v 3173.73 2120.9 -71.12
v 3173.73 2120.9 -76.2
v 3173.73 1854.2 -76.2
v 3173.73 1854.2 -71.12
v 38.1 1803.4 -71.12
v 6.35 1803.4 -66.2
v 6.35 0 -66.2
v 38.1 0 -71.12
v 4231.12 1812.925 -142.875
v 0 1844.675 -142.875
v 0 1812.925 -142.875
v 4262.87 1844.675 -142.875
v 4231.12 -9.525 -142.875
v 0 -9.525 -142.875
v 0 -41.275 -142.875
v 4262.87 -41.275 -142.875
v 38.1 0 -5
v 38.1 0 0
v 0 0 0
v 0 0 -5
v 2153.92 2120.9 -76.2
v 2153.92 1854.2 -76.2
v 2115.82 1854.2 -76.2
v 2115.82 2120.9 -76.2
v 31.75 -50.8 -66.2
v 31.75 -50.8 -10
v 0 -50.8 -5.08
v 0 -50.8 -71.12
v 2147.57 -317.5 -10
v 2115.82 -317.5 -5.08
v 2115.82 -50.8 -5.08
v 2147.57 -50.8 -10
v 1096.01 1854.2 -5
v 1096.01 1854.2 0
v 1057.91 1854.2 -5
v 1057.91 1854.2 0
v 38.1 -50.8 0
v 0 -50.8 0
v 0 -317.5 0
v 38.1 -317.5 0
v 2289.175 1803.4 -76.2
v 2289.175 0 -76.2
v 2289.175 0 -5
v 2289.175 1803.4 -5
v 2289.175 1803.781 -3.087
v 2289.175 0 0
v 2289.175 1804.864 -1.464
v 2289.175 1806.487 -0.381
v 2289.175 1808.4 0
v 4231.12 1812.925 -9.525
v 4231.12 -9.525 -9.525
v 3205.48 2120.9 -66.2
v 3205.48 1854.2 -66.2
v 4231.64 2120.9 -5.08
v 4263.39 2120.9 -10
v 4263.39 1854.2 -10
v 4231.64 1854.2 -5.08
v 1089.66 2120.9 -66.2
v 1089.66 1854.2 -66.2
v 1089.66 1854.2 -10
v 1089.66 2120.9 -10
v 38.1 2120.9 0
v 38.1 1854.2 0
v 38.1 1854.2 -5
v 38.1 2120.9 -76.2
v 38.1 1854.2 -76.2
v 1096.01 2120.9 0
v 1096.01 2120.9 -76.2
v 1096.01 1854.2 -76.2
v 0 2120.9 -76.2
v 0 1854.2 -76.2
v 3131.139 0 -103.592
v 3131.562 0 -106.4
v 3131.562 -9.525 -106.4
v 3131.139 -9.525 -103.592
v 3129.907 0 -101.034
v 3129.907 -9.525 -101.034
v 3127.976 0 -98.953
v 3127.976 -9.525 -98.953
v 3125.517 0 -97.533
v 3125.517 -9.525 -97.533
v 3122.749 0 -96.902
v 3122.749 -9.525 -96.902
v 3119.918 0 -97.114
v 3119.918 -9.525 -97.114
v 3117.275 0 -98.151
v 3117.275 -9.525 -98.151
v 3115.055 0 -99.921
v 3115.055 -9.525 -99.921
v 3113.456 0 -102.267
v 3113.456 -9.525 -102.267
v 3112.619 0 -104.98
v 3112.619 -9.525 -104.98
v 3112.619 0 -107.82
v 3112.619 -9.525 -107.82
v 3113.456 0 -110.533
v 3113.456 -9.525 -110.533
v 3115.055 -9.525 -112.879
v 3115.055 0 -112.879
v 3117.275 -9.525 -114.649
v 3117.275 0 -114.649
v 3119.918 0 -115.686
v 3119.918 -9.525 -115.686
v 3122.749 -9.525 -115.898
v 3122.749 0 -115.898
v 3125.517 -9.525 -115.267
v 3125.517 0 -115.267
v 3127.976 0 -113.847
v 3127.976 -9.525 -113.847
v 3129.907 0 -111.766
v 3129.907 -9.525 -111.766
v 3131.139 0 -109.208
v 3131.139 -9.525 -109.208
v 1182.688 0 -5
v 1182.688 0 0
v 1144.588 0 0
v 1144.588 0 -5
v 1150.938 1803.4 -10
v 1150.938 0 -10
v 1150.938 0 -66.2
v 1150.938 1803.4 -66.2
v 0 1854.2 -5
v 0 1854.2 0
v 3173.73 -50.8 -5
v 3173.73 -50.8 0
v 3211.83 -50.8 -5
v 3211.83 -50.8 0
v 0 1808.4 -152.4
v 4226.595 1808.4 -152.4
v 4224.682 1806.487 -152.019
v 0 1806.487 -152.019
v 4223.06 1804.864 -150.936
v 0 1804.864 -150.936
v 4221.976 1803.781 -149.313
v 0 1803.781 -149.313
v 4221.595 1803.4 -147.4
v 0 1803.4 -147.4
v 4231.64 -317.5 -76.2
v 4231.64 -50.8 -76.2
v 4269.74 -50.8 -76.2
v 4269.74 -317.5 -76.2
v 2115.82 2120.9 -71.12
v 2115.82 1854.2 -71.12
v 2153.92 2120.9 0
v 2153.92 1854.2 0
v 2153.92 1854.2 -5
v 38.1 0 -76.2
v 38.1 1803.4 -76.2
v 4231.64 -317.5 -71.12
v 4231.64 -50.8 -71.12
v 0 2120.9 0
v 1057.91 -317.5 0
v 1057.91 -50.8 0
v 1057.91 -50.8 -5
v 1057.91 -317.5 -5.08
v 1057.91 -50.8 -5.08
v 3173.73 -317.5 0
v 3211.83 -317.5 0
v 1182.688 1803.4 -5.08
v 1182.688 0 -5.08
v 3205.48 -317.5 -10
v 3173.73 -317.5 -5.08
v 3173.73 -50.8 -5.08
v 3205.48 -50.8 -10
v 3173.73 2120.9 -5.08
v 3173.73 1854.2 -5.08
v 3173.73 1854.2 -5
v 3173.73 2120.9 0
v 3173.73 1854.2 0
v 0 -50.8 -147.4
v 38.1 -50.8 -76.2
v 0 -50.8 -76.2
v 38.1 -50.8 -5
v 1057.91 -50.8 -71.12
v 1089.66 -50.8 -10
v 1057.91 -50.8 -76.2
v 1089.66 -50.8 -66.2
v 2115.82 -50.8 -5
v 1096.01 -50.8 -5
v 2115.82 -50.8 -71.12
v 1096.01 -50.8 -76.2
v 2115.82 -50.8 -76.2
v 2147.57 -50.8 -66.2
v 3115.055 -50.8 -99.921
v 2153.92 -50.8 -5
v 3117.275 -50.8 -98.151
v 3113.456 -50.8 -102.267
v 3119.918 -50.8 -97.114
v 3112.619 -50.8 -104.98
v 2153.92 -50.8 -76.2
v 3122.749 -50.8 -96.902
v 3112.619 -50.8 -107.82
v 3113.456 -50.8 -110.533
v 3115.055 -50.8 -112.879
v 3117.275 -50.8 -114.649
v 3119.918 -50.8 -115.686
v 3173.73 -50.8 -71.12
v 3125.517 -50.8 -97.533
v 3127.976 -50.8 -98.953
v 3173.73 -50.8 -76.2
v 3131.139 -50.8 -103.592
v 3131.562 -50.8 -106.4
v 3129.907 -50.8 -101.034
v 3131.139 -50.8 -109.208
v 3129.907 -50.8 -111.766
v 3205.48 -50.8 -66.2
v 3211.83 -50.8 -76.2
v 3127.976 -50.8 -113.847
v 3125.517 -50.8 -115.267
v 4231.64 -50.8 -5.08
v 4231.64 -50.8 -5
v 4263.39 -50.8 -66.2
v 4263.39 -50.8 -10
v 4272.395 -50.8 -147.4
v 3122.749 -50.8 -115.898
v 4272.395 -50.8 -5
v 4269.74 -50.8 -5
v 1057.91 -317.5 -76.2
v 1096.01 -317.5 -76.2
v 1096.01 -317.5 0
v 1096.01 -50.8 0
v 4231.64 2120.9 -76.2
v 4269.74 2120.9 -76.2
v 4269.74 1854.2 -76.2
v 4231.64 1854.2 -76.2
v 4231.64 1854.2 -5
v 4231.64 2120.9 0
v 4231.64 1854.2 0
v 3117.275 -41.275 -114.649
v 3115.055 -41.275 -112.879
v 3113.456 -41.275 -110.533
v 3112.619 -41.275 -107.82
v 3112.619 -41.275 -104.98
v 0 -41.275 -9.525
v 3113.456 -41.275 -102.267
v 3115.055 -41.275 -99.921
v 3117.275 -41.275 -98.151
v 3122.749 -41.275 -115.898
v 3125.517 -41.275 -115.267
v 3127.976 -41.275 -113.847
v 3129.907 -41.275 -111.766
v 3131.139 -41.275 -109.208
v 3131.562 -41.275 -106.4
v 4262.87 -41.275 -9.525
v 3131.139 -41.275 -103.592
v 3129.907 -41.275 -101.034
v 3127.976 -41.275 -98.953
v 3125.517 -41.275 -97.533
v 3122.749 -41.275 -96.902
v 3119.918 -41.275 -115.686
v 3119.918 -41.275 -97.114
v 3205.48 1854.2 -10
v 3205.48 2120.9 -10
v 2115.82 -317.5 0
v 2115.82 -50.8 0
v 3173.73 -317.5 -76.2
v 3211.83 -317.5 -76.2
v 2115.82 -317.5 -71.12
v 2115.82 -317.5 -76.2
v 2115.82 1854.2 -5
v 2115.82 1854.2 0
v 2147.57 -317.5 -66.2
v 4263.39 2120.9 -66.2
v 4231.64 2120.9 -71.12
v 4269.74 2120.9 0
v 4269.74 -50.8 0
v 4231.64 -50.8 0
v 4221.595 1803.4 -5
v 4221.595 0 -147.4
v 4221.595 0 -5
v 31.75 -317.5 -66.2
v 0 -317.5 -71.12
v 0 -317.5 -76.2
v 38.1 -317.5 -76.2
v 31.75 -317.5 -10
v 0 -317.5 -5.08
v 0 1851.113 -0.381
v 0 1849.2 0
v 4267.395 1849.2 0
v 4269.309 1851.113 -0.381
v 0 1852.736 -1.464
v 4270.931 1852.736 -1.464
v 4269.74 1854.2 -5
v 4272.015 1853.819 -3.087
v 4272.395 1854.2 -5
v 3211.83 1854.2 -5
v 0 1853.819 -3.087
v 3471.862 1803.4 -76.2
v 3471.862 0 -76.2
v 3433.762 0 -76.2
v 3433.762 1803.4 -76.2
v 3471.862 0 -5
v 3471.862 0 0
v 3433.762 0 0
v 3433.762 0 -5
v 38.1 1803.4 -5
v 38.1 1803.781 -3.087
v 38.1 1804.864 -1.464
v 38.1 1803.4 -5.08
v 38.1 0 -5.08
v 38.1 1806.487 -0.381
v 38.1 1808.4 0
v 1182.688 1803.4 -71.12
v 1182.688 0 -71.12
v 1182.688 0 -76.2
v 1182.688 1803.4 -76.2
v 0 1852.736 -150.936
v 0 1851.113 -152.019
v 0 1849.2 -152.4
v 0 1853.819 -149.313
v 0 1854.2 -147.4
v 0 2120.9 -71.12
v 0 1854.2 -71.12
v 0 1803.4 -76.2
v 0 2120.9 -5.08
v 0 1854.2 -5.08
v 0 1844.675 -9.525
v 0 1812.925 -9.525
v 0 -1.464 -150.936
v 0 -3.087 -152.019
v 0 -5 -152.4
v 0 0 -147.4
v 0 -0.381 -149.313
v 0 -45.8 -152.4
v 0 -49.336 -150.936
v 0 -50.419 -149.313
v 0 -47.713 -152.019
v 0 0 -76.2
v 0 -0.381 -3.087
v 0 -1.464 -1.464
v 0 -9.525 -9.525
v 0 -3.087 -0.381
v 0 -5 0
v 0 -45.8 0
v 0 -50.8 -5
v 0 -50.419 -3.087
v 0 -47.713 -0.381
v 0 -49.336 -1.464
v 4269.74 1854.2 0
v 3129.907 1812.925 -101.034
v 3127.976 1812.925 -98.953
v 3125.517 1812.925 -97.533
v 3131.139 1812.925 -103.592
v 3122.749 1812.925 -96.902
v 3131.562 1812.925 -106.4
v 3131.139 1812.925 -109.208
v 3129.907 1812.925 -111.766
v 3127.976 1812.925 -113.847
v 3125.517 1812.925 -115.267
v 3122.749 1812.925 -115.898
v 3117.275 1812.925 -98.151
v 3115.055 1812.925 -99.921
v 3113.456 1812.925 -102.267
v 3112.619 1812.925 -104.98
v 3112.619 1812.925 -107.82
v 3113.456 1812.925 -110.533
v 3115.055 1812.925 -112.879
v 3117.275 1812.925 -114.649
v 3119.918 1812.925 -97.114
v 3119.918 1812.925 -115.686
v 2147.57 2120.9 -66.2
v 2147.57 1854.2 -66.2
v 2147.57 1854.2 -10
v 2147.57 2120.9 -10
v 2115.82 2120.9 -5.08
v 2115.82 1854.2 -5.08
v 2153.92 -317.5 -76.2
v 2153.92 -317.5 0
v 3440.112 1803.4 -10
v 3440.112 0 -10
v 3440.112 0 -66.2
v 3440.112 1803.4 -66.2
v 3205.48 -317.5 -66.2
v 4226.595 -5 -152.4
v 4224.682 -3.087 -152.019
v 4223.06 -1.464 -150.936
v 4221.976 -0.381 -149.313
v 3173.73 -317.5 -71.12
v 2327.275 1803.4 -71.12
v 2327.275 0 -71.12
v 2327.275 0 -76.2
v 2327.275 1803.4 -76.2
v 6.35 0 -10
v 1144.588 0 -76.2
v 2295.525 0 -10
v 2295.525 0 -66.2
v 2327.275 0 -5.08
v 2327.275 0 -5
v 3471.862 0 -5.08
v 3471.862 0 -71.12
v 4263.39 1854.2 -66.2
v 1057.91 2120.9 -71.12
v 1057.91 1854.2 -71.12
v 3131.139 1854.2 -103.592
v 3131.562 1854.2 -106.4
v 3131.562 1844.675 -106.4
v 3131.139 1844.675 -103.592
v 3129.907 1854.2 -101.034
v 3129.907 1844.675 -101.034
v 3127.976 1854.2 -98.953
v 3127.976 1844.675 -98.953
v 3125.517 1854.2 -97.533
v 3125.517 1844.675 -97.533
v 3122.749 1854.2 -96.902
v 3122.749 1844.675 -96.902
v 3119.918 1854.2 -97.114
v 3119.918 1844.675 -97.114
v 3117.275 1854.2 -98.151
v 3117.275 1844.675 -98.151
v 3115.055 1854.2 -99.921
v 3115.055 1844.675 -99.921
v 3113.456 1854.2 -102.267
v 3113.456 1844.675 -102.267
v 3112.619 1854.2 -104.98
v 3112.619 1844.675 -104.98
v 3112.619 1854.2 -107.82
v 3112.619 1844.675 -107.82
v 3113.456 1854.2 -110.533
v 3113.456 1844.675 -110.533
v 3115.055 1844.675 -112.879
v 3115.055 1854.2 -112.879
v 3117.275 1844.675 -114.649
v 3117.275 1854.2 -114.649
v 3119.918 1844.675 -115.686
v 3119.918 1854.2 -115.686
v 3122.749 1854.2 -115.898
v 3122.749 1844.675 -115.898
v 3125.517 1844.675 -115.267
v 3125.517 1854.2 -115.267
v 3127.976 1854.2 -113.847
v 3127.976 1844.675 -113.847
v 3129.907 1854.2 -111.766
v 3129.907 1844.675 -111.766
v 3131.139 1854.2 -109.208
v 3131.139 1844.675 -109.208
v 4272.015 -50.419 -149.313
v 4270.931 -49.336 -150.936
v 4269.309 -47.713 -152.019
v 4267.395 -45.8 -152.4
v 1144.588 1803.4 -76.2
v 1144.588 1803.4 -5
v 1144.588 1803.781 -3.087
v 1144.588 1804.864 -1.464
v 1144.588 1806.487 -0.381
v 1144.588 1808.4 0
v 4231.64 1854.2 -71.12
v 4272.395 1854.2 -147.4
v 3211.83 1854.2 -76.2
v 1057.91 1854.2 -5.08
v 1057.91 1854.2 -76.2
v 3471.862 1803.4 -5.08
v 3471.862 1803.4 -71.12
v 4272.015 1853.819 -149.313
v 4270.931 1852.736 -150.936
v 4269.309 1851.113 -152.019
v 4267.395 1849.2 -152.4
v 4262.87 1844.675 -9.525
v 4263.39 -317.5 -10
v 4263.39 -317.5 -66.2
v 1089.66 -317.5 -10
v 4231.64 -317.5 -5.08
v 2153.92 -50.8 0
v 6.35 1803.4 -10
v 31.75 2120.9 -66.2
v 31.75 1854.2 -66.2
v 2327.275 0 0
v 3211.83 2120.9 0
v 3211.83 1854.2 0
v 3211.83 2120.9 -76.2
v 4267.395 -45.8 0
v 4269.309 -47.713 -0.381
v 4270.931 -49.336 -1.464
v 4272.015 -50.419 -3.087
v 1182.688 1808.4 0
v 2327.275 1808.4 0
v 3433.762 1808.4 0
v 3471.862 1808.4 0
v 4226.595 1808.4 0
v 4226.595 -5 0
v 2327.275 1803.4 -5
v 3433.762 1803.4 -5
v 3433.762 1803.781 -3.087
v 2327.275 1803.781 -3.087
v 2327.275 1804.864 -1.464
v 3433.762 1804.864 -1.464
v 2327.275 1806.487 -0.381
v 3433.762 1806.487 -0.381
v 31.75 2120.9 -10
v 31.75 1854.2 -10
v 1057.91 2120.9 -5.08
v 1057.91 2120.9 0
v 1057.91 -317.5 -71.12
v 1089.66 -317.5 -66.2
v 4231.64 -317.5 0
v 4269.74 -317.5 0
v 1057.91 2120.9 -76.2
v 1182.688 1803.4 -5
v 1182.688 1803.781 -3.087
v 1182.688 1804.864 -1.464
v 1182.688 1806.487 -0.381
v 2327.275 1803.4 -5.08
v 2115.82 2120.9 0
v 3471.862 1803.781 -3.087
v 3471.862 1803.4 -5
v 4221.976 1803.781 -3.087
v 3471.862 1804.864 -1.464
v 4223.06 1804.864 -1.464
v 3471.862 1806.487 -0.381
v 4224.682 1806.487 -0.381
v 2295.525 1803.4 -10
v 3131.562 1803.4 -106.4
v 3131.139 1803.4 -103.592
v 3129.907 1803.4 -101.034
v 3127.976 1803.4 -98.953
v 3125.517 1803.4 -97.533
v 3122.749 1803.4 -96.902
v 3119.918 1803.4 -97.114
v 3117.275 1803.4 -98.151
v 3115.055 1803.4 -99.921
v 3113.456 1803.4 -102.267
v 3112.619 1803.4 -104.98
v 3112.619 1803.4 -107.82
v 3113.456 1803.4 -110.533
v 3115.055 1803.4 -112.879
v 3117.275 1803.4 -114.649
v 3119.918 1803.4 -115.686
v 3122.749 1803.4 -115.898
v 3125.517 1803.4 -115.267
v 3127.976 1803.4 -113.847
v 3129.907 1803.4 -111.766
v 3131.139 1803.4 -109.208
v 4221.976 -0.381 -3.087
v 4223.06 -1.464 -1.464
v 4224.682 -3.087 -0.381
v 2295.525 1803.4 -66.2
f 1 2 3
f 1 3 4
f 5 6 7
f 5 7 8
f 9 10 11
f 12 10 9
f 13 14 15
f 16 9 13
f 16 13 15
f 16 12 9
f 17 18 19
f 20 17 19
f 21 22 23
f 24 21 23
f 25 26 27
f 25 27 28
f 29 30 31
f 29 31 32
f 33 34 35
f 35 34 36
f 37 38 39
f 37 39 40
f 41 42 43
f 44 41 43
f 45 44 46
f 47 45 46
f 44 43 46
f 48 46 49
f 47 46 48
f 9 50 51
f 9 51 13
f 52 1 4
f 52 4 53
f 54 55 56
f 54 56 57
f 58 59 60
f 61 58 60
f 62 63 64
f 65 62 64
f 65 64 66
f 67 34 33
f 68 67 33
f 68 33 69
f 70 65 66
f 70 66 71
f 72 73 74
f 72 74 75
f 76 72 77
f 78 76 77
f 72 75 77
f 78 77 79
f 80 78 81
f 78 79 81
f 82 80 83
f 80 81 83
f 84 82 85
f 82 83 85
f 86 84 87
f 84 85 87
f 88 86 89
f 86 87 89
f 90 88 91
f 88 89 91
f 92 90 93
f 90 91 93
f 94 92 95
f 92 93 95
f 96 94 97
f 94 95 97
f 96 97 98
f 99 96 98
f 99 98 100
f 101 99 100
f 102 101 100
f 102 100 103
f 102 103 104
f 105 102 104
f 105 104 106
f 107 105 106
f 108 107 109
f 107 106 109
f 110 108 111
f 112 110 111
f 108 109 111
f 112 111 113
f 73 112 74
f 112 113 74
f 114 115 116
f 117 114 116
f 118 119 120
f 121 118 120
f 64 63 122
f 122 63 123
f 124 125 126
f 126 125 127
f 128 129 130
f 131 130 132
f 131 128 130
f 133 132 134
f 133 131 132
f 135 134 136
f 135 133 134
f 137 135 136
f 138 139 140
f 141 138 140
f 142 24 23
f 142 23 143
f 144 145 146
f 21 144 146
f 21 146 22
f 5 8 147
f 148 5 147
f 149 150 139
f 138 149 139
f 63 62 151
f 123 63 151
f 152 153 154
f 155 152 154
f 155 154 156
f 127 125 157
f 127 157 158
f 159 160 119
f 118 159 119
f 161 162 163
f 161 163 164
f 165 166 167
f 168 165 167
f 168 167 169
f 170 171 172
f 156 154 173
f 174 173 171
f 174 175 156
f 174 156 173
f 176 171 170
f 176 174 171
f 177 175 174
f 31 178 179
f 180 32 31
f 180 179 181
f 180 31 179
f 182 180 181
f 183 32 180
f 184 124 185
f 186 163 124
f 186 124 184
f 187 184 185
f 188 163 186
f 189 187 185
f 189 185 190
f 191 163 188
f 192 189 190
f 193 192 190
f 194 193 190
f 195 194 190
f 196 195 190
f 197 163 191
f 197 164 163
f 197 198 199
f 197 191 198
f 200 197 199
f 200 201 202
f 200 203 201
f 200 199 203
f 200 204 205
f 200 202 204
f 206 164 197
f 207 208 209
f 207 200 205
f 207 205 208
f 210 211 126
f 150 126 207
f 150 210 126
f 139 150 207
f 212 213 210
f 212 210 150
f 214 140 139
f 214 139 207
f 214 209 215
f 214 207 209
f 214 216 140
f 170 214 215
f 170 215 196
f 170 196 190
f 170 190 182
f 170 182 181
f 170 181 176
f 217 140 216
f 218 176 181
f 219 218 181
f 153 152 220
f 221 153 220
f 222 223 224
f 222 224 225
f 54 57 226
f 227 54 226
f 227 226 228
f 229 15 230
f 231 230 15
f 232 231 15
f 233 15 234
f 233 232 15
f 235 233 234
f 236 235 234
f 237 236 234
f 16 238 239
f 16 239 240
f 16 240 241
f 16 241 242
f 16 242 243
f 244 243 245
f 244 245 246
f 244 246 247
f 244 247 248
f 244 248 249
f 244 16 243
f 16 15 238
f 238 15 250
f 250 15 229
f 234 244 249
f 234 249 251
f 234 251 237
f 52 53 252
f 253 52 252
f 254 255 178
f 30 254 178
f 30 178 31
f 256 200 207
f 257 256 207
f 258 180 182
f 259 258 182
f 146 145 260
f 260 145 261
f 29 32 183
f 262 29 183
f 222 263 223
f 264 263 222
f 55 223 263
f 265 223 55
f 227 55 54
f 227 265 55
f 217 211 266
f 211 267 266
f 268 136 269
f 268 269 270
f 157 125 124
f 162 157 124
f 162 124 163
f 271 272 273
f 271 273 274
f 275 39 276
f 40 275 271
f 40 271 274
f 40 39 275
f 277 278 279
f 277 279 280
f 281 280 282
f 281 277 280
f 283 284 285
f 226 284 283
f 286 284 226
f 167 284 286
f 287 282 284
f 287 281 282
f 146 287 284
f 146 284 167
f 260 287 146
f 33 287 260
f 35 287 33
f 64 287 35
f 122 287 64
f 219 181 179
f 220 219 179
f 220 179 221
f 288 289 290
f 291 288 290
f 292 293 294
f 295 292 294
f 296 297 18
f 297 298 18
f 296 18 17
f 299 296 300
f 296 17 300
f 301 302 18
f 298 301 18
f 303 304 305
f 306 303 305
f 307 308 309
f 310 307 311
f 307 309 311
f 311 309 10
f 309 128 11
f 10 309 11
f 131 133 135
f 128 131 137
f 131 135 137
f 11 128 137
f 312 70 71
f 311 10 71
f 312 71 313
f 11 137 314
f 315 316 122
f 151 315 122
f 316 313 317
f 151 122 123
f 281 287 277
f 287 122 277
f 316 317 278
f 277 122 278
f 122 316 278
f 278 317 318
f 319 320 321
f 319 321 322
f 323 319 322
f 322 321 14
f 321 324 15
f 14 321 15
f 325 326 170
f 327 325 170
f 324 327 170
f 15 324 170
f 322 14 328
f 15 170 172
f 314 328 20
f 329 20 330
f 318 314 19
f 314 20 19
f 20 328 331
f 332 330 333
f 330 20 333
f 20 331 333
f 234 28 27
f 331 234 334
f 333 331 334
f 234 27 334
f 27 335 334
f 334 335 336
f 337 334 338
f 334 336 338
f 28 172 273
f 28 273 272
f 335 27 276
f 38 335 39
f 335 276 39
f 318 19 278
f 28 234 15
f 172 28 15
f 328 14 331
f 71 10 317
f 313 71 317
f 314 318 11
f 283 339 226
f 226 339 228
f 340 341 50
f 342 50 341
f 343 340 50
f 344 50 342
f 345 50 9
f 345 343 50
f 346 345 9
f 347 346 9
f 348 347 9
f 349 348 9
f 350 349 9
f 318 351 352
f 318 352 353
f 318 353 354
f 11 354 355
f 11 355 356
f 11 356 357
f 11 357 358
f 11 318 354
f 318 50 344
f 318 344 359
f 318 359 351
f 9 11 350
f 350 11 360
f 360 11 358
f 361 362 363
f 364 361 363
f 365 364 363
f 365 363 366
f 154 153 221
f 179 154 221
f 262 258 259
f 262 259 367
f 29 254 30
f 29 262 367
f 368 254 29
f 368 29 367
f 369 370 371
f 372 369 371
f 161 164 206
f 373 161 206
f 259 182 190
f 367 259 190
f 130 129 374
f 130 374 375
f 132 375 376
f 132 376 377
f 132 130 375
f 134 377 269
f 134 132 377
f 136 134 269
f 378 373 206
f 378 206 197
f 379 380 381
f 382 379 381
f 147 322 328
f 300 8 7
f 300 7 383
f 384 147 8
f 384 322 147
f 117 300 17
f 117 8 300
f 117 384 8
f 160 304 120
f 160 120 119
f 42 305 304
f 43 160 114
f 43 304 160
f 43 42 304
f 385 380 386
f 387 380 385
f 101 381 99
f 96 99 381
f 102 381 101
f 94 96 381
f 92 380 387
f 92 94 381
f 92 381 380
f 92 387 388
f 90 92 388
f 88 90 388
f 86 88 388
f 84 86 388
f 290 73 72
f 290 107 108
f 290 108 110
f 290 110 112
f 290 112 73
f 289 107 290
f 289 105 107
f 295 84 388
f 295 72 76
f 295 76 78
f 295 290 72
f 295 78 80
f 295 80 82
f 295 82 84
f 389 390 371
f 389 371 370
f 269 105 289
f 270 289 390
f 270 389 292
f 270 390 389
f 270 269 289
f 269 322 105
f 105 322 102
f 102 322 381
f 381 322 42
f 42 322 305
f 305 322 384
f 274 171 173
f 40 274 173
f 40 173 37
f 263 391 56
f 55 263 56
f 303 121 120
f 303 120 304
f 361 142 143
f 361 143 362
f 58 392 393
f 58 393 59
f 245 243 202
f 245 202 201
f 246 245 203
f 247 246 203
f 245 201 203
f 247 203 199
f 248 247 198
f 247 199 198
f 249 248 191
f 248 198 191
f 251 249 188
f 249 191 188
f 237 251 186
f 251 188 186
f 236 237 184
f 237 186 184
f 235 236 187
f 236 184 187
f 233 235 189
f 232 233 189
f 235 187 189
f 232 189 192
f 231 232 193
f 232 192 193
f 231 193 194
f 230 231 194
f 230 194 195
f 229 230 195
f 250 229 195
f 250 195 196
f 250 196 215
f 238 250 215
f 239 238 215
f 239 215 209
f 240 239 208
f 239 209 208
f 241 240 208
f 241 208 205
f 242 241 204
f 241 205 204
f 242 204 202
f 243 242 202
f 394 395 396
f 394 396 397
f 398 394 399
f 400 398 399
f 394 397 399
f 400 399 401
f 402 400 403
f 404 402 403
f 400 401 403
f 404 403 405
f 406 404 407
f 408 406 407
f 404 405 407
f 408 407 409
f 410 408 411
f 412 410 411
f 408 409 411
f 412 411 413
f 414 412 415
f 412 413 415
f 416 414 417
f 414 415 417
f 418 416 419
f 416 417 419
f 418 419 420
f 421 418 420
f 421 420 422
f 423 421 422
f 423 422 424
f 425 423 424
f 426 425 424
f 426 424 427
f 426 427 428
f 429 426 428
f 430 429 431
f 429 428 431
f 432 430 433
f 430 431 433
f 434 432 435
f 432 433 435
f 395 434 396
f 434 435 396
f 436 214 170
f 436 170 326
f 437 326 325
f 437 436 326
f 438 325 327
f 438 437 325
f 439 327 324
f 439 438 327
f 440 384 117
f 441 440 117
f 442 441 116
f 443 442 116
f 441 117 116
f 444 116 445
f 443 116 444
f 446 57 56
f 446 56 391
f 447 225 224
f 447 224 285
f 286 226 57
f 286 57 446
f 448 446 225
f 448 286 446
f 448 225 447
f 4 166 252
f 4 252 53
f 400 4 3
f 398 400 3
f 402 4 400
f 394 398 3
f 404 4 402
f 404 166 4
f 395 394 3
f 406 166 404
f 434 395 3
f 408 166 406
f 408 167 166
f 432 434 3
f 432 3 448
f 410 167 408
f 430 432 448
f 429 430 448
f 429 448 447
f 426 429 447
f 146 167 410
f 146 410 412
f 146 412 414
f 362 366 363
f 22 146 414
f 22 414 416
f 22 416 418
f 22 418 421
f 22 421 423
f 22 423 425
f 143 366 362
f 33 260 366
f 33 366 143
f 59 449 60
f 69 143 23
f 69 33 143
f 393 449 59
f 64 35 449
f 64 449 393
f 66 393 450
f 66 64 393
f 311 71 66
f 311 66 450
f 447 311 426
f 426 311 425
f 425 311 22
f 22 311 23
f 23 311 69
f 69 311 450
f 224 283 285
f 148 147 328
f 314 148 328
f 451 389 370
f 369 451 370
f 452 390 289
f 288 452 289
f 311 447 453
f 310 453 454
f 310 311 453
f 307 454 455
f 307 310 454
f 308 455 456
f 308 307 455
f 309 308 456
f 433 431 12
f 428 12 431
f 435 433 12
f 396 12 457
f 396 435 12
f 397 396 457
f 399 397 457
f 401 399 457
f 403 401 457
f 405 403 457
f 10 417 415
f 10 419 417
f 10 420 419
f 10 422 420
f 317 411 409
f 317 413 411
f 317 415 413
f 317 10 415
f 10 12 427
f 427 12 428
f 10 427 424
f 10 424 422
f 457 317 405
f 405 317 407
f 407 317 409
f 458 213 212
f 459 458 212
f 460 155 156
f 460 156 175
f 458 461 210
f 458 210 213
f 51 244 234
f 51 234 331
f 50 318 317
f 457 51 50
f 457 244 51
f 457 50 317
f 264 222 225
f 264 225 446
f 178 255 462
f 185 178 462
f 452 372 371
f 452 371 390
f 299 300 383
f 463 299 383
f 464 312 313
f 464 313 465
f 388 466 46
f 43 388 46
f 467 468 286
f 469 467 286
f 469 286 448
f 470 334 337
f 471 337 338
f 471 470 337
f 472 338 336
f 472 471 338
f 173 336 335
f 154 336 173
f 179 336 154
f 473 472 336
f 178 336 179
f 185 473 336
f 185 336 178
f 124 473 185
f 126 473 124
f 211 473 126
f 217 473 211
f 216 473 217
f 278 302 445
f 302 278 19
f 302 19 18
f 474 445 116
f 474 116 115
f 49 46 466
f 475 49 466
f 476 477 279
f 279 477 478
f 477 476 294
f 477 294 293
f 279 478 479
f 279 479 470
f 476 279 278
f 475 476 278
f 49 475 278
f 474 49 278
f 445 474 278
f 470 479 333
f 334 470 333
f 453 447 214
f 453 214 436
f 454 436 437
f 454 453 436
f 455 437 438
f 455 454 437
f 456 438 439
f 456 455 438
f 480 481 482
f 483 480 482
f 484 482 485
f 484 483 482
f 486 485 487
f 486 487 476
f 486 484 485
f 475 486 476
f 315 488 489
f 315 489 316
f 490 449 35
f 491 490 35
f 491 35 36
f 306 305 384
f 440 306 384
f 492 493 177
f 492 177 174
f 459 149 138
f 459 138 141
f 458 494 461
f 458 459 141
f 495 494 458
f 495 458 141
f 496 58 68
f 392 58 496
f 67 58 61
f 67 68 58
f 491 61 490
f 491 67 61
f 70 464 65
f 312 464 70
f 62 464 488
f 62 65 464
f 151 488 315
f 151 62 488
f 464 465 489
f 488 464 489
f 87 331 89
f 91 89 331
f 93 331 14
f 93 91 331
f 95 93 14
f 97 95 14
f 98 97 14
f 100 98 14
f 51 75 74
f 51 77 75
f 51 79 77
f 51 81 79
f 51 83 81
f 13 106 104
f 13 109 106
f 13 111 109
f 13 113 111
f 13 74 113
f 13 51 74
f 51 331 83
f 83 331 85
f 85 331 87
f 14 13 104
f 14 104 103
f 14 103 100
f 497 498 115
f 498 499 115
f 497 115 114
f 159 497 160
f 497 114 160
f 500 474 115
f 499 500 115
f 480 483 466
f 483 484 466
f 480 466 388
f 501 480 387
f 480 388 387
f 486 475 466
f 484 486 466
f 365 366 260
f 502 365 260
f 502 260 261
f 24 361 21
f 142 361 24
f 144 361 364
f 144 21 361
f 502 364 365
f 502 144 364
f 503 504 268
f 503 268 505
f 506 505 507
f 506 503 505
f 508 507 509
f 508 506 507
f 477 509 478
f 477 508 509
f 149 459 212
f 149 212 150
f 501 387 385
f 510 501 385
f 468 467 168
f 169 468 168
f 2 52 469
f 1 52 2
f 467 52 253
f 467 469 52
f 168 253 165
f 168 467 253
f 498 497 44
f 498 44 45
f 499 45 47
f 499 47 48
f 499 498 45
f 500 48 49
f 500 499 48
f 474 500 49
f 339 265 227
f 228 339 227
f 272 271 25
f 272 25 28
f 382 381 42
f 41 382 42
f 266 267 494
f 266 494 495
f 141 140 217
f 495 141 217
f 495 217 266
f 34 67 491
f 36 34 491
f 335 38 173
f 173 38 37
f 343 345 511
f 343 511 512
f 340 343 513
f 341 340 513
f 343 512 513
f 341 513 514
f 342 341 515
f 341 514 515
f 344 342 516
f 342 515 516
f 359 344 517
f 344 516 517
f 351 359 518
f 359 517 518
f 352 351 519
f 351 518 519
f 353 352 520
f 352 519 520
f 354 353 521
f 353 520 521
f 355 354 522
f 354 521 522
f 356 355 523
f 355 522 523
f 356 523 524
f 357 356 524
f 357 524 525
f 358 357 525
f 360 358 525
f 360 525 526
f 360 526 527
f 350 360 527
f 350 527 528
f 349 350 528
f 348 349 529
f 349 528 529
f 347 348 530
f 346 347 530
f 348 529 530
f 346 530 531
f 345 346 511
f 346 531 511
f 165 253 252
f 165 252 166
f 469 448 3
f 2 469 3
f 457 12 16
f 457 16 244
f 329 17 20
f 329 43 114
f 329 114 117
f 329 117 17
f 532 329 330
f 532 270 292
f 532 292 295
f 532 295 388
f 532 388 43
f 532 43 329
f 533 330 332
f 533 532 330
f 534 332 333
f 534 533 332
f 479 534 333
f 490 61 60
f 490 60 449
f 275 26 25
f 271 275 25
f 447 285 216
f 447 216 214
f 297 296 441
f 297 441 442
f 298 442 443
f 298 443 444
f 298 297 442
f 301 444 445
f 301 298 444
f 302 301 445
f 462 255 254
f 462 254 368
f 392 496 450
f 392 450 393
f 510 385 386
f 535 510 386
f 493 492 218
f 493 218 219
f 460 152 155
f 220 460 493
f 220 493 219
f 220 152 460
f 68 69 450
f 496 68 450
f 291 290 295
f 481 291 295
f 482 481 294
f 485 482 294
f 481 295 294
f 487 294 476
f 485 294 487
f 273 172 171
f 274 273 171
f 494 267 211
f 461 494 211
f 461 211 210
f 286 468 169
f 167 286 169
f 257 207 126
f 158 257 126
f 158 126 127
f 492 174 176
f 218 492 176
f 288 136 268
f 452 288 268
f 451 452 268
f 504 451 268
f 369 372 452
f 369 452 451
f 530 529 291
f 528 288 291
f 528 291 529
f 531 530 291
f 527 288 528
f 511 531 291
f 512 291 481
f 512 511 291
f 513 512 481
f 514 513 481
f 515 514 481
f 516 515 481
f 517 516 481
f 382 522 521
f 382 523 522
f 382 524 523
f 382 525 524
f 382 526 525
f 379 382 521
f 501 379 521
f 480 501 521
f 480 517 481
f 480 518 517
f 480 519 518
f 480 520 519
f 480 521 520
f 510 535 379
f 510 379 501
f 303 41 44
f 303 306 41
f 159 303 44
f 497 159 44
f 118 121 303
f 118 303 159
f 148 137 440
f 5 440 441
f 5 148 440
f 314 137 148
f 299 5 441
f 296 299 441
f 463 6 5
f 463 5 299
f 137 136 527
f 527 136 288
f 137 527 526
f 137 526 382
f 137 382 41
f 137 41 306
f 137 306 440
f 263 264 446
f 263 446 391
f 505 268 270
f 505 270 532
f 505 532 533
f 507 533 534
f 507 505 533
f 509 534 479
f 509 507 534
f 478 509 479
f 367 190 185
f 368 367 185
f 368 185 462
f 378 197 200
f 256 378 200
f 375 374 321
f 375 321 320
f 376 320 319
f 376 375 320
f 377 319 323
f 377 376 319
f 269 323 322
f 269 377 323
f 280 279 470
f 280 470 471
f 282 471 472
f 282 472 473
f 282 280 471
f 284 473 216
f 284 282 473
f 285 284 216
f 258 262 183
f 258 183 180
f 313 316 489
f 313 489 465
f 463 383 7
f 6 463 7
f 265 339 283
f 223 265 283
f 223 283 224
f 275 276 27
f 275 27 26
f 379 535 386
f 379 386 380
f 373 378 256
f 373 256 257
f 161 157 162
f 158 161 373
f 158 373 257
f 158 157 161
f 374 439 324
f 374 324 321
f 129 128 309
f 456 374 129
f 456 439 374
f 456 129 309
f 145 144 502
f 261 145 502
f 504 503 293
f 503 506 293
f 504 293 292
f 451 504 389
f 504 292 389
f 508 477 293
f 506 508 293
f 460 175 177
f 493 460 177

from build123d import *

# Parameters (mm, degrees)
F1_W      = 31.75
F1_H      = 133.35
F5_W      = 38.1
F5_H      = 5
F6_DEPTH  = 266.7
F7_W      = 38.1
F7_H      = 5
F8_DEPTH  = 266.7
F9_R      = 9.525
F10_DEPTH = 2640


with BuildPart() as f2:
    # F2: sweep along a path in F0
    with BuildLine(Plane.XY) as f2_path:
        Line((0, 0), (4221.5954545455, 0))
        Line((4221.5954545455, 0), (4221.5954545455, 1803.4))
        Line((4221.5954545455, 1803.4), (0, 1803.4))
    # F1 (on Right) → F2 (sweep)
    with BuildSketch(Plane.YZ):
        with BuildLine():
            ThreePointArc((0, -5), (-1.4644660941, -1.4644660941), (-5, 0))
            Line((-5, 0), (-45.8, 0))
            ThreePointArc((-45.8, 0), (-49.3355339059, -1.4644660941), (-50.8, -5))
            Line((-50.8, -5), (-50.8, -147.4))
            ThreePointArc((-50.8, -147.4), (-49.3355339059, -150.9355339059), (-45.8, -152.4))
            Line((-45.8, -152.4), (-5, -152.4))
            ThreePointArc((-5, -152.4), (-1.4644660941, -150.9355339059), (0, -147.4))
            Line((0, -147.4), (0, -5))
        make_face()
        with Locations((-25.4, -76.2)):
            Rectangle(F1_W, F1_H, mode=Mode.SUBTRACT)
    sweep(path=f2_path.line, transition=Transition.RIGHT)

    # F3 (on face) → F4 (join, up to the next surface of F2)
    with BuildSketch(Plane(origin=(0, 0, 0), x_dir=(-1, 0, 0), z_dir=(0, 1, 0))):
        Polygon((0, 0), (-38.1, 0), (-38.1, -5.08), (-6.35, -10), (-6.35, -66.2), (-38.1, -71.12), (-38.1, -76.2), (0, -76.2), align=None)
        Polygon((-1150.9375, -10), (-1150.9375, -66.2), (-1182.6875, -71.12), (-1182.6875, -76.2), (-1144.5875, -76.2), (-1144.5875, 0), (-1182.6875, 0), (-1182.6875, -5.08), align=None)
        Polygon((-2295.525, -10), (-2295.525, -66.2), (-2327.275, -71.12), (-2327.275, -76.2), (-2289.175, -76.2), (-2289.175, 0), (-2327.275, 0), (-2327.275, -5.08), align=None)
        Polygon((-3440.1125, -10), (-3440.1125, -66.2), (-3471.8625, -71.12), (-3471.8625, -76.2), (-3433.7625, -76.2), (-3433.7625, 0), (-3471.8625, 0), (-3471.8625, -5.08), align=None)
    extrude(until=Until.NEXT)

    # F5 (on face) → F6 (join)
    with BuildSketch(Plane.XZ.offset(50.8)):
        Polygon((38.1, -5), (0, -5), (0, -5.08), (31.75, -10), (31.75, -66.2), (0, -71.12), (0, -76.2), (38.1, -76.2), align=None)
        Polygon((1096.01, -5), (1057.91, -5), (1057.91, -5.08), (1089.66, -10), (1089.66, -66.2), (1057.91, -71.12), (1057.91, -76.2), (1096.01, -76.2), align=None)
        Polygon((2153.92, -5), (2115.82, -5), (2115.82, -5.08), (2147.57, -10), (2147.57, -66.2), (2115.82, -71.12), (2115.82, -76.2), (2153.92, -76.2), align=None)
        Polygon((3211.83, -5), (3173.73, -5), (3173.73, -5.08), (3205.48, -10), (3205.48, -66.2), (3173.73, -71.12), (3173.73, -76.2), (3211.83, -76.2), align=None)
        Polygon((4269.74, -76.2), (4269.74, -5), (4231.64, -5), (4231.64, -5.08), (4263.39, -10), (4263.39, -66.2), (4231.64, -71.12), (4231.64, -76.2), align=None)
        with Locations((4250.69, -2.5)):
            Rectangle(F5_W, F5_H)
        with Locations((3192.78, -2.5)):
            Rectangle(F5_W, F5_H)
        with Locations((2134.87, -2.5)):
            Rectangle(F5_W, F5_H)
        with Locations((1076.96, -2.5)):
            Rectangle(F5_W, F5_H)
        with Locations((19.05, -2.5)):
            Rectangle(F5_W, F5_H)
    extrude(amount=F6_DEPTH)

    # F7 (on face) → F8 (join)
    with BuildSketch(Plane(origin=(0, 1854.2, 0), x_dir=(-1, 0, 0), z_dir=(0, 1, 0))):
        Polygon((0, -5), (-38.1, -5), (-38.1, -76.2), (0, -76.2), (0, -71.12), (-31.75, -66.2), (-31.75, -10), (0, -5.08), align=None)
        with Locations((-19.05, -2.5)):
            Rectangle(F7_W, F7_H)
        with Locations((-1076.96, -2.5)):
            Rectangle(F7_W, F7_H)
        Polygon((-1057.91, -5.08), (-1057.91, -5), (-1096.01, -5), (-1096.01, -76.2), (-1057.91, -76.2), (-1057.91, -71.12), (-1089.66, -66.2), (-1089.66, -10), align=None)
        Polygon((-2115.82, -5.08), (-2115.82, -5), (-2153.92, -5), (-2153.92, -76.2), (-2115.82, -76.2), (-2115.82, -71.12), (-2147.57, -66.2), (-2147.57, -10), align=None)
        with Locations((-2134.87, -2.5)):
            Rectangle(F7_W, F7_H)
        with Locations((-3192.78, -2.5)):
            Rectangle(F7_W, F7_H)
        Polygon((-3173.73, -5.08), (-3173.73, -5), (-3211.83, -5), (-3211.83, -76.2), (-3173.73, -76.2), (-3173.73, -71.12), (-3205.48, -66.2), (-3205.48, -10), align=None)
        with Locations((-4250.69, -2.5)):
            Rectangle(F7_W, F7_H)
        Polygon((-4231.64, -5), (-4269.74, -5), (-4269.74, -76.2), (-4231.64, -76.2), (-4231.64, -71.12), (-4263.39, -66.2), (-4263.39, -10), (-4231.64, -5.08), align=None)
    extrude(amount=F8_DEPTH)

    # F9 (on face) → F10 (cut, symmetric)
    with BuildSketch(Plane.XZ.offset(-1803.4)):
        with Locations((3122.0374545455, -106.4)):
            Circle(F9_R)
    extrude(amount=F10_DEPTH, both=True, mode=Mode.SUBTRACT)


solid = f2.part
